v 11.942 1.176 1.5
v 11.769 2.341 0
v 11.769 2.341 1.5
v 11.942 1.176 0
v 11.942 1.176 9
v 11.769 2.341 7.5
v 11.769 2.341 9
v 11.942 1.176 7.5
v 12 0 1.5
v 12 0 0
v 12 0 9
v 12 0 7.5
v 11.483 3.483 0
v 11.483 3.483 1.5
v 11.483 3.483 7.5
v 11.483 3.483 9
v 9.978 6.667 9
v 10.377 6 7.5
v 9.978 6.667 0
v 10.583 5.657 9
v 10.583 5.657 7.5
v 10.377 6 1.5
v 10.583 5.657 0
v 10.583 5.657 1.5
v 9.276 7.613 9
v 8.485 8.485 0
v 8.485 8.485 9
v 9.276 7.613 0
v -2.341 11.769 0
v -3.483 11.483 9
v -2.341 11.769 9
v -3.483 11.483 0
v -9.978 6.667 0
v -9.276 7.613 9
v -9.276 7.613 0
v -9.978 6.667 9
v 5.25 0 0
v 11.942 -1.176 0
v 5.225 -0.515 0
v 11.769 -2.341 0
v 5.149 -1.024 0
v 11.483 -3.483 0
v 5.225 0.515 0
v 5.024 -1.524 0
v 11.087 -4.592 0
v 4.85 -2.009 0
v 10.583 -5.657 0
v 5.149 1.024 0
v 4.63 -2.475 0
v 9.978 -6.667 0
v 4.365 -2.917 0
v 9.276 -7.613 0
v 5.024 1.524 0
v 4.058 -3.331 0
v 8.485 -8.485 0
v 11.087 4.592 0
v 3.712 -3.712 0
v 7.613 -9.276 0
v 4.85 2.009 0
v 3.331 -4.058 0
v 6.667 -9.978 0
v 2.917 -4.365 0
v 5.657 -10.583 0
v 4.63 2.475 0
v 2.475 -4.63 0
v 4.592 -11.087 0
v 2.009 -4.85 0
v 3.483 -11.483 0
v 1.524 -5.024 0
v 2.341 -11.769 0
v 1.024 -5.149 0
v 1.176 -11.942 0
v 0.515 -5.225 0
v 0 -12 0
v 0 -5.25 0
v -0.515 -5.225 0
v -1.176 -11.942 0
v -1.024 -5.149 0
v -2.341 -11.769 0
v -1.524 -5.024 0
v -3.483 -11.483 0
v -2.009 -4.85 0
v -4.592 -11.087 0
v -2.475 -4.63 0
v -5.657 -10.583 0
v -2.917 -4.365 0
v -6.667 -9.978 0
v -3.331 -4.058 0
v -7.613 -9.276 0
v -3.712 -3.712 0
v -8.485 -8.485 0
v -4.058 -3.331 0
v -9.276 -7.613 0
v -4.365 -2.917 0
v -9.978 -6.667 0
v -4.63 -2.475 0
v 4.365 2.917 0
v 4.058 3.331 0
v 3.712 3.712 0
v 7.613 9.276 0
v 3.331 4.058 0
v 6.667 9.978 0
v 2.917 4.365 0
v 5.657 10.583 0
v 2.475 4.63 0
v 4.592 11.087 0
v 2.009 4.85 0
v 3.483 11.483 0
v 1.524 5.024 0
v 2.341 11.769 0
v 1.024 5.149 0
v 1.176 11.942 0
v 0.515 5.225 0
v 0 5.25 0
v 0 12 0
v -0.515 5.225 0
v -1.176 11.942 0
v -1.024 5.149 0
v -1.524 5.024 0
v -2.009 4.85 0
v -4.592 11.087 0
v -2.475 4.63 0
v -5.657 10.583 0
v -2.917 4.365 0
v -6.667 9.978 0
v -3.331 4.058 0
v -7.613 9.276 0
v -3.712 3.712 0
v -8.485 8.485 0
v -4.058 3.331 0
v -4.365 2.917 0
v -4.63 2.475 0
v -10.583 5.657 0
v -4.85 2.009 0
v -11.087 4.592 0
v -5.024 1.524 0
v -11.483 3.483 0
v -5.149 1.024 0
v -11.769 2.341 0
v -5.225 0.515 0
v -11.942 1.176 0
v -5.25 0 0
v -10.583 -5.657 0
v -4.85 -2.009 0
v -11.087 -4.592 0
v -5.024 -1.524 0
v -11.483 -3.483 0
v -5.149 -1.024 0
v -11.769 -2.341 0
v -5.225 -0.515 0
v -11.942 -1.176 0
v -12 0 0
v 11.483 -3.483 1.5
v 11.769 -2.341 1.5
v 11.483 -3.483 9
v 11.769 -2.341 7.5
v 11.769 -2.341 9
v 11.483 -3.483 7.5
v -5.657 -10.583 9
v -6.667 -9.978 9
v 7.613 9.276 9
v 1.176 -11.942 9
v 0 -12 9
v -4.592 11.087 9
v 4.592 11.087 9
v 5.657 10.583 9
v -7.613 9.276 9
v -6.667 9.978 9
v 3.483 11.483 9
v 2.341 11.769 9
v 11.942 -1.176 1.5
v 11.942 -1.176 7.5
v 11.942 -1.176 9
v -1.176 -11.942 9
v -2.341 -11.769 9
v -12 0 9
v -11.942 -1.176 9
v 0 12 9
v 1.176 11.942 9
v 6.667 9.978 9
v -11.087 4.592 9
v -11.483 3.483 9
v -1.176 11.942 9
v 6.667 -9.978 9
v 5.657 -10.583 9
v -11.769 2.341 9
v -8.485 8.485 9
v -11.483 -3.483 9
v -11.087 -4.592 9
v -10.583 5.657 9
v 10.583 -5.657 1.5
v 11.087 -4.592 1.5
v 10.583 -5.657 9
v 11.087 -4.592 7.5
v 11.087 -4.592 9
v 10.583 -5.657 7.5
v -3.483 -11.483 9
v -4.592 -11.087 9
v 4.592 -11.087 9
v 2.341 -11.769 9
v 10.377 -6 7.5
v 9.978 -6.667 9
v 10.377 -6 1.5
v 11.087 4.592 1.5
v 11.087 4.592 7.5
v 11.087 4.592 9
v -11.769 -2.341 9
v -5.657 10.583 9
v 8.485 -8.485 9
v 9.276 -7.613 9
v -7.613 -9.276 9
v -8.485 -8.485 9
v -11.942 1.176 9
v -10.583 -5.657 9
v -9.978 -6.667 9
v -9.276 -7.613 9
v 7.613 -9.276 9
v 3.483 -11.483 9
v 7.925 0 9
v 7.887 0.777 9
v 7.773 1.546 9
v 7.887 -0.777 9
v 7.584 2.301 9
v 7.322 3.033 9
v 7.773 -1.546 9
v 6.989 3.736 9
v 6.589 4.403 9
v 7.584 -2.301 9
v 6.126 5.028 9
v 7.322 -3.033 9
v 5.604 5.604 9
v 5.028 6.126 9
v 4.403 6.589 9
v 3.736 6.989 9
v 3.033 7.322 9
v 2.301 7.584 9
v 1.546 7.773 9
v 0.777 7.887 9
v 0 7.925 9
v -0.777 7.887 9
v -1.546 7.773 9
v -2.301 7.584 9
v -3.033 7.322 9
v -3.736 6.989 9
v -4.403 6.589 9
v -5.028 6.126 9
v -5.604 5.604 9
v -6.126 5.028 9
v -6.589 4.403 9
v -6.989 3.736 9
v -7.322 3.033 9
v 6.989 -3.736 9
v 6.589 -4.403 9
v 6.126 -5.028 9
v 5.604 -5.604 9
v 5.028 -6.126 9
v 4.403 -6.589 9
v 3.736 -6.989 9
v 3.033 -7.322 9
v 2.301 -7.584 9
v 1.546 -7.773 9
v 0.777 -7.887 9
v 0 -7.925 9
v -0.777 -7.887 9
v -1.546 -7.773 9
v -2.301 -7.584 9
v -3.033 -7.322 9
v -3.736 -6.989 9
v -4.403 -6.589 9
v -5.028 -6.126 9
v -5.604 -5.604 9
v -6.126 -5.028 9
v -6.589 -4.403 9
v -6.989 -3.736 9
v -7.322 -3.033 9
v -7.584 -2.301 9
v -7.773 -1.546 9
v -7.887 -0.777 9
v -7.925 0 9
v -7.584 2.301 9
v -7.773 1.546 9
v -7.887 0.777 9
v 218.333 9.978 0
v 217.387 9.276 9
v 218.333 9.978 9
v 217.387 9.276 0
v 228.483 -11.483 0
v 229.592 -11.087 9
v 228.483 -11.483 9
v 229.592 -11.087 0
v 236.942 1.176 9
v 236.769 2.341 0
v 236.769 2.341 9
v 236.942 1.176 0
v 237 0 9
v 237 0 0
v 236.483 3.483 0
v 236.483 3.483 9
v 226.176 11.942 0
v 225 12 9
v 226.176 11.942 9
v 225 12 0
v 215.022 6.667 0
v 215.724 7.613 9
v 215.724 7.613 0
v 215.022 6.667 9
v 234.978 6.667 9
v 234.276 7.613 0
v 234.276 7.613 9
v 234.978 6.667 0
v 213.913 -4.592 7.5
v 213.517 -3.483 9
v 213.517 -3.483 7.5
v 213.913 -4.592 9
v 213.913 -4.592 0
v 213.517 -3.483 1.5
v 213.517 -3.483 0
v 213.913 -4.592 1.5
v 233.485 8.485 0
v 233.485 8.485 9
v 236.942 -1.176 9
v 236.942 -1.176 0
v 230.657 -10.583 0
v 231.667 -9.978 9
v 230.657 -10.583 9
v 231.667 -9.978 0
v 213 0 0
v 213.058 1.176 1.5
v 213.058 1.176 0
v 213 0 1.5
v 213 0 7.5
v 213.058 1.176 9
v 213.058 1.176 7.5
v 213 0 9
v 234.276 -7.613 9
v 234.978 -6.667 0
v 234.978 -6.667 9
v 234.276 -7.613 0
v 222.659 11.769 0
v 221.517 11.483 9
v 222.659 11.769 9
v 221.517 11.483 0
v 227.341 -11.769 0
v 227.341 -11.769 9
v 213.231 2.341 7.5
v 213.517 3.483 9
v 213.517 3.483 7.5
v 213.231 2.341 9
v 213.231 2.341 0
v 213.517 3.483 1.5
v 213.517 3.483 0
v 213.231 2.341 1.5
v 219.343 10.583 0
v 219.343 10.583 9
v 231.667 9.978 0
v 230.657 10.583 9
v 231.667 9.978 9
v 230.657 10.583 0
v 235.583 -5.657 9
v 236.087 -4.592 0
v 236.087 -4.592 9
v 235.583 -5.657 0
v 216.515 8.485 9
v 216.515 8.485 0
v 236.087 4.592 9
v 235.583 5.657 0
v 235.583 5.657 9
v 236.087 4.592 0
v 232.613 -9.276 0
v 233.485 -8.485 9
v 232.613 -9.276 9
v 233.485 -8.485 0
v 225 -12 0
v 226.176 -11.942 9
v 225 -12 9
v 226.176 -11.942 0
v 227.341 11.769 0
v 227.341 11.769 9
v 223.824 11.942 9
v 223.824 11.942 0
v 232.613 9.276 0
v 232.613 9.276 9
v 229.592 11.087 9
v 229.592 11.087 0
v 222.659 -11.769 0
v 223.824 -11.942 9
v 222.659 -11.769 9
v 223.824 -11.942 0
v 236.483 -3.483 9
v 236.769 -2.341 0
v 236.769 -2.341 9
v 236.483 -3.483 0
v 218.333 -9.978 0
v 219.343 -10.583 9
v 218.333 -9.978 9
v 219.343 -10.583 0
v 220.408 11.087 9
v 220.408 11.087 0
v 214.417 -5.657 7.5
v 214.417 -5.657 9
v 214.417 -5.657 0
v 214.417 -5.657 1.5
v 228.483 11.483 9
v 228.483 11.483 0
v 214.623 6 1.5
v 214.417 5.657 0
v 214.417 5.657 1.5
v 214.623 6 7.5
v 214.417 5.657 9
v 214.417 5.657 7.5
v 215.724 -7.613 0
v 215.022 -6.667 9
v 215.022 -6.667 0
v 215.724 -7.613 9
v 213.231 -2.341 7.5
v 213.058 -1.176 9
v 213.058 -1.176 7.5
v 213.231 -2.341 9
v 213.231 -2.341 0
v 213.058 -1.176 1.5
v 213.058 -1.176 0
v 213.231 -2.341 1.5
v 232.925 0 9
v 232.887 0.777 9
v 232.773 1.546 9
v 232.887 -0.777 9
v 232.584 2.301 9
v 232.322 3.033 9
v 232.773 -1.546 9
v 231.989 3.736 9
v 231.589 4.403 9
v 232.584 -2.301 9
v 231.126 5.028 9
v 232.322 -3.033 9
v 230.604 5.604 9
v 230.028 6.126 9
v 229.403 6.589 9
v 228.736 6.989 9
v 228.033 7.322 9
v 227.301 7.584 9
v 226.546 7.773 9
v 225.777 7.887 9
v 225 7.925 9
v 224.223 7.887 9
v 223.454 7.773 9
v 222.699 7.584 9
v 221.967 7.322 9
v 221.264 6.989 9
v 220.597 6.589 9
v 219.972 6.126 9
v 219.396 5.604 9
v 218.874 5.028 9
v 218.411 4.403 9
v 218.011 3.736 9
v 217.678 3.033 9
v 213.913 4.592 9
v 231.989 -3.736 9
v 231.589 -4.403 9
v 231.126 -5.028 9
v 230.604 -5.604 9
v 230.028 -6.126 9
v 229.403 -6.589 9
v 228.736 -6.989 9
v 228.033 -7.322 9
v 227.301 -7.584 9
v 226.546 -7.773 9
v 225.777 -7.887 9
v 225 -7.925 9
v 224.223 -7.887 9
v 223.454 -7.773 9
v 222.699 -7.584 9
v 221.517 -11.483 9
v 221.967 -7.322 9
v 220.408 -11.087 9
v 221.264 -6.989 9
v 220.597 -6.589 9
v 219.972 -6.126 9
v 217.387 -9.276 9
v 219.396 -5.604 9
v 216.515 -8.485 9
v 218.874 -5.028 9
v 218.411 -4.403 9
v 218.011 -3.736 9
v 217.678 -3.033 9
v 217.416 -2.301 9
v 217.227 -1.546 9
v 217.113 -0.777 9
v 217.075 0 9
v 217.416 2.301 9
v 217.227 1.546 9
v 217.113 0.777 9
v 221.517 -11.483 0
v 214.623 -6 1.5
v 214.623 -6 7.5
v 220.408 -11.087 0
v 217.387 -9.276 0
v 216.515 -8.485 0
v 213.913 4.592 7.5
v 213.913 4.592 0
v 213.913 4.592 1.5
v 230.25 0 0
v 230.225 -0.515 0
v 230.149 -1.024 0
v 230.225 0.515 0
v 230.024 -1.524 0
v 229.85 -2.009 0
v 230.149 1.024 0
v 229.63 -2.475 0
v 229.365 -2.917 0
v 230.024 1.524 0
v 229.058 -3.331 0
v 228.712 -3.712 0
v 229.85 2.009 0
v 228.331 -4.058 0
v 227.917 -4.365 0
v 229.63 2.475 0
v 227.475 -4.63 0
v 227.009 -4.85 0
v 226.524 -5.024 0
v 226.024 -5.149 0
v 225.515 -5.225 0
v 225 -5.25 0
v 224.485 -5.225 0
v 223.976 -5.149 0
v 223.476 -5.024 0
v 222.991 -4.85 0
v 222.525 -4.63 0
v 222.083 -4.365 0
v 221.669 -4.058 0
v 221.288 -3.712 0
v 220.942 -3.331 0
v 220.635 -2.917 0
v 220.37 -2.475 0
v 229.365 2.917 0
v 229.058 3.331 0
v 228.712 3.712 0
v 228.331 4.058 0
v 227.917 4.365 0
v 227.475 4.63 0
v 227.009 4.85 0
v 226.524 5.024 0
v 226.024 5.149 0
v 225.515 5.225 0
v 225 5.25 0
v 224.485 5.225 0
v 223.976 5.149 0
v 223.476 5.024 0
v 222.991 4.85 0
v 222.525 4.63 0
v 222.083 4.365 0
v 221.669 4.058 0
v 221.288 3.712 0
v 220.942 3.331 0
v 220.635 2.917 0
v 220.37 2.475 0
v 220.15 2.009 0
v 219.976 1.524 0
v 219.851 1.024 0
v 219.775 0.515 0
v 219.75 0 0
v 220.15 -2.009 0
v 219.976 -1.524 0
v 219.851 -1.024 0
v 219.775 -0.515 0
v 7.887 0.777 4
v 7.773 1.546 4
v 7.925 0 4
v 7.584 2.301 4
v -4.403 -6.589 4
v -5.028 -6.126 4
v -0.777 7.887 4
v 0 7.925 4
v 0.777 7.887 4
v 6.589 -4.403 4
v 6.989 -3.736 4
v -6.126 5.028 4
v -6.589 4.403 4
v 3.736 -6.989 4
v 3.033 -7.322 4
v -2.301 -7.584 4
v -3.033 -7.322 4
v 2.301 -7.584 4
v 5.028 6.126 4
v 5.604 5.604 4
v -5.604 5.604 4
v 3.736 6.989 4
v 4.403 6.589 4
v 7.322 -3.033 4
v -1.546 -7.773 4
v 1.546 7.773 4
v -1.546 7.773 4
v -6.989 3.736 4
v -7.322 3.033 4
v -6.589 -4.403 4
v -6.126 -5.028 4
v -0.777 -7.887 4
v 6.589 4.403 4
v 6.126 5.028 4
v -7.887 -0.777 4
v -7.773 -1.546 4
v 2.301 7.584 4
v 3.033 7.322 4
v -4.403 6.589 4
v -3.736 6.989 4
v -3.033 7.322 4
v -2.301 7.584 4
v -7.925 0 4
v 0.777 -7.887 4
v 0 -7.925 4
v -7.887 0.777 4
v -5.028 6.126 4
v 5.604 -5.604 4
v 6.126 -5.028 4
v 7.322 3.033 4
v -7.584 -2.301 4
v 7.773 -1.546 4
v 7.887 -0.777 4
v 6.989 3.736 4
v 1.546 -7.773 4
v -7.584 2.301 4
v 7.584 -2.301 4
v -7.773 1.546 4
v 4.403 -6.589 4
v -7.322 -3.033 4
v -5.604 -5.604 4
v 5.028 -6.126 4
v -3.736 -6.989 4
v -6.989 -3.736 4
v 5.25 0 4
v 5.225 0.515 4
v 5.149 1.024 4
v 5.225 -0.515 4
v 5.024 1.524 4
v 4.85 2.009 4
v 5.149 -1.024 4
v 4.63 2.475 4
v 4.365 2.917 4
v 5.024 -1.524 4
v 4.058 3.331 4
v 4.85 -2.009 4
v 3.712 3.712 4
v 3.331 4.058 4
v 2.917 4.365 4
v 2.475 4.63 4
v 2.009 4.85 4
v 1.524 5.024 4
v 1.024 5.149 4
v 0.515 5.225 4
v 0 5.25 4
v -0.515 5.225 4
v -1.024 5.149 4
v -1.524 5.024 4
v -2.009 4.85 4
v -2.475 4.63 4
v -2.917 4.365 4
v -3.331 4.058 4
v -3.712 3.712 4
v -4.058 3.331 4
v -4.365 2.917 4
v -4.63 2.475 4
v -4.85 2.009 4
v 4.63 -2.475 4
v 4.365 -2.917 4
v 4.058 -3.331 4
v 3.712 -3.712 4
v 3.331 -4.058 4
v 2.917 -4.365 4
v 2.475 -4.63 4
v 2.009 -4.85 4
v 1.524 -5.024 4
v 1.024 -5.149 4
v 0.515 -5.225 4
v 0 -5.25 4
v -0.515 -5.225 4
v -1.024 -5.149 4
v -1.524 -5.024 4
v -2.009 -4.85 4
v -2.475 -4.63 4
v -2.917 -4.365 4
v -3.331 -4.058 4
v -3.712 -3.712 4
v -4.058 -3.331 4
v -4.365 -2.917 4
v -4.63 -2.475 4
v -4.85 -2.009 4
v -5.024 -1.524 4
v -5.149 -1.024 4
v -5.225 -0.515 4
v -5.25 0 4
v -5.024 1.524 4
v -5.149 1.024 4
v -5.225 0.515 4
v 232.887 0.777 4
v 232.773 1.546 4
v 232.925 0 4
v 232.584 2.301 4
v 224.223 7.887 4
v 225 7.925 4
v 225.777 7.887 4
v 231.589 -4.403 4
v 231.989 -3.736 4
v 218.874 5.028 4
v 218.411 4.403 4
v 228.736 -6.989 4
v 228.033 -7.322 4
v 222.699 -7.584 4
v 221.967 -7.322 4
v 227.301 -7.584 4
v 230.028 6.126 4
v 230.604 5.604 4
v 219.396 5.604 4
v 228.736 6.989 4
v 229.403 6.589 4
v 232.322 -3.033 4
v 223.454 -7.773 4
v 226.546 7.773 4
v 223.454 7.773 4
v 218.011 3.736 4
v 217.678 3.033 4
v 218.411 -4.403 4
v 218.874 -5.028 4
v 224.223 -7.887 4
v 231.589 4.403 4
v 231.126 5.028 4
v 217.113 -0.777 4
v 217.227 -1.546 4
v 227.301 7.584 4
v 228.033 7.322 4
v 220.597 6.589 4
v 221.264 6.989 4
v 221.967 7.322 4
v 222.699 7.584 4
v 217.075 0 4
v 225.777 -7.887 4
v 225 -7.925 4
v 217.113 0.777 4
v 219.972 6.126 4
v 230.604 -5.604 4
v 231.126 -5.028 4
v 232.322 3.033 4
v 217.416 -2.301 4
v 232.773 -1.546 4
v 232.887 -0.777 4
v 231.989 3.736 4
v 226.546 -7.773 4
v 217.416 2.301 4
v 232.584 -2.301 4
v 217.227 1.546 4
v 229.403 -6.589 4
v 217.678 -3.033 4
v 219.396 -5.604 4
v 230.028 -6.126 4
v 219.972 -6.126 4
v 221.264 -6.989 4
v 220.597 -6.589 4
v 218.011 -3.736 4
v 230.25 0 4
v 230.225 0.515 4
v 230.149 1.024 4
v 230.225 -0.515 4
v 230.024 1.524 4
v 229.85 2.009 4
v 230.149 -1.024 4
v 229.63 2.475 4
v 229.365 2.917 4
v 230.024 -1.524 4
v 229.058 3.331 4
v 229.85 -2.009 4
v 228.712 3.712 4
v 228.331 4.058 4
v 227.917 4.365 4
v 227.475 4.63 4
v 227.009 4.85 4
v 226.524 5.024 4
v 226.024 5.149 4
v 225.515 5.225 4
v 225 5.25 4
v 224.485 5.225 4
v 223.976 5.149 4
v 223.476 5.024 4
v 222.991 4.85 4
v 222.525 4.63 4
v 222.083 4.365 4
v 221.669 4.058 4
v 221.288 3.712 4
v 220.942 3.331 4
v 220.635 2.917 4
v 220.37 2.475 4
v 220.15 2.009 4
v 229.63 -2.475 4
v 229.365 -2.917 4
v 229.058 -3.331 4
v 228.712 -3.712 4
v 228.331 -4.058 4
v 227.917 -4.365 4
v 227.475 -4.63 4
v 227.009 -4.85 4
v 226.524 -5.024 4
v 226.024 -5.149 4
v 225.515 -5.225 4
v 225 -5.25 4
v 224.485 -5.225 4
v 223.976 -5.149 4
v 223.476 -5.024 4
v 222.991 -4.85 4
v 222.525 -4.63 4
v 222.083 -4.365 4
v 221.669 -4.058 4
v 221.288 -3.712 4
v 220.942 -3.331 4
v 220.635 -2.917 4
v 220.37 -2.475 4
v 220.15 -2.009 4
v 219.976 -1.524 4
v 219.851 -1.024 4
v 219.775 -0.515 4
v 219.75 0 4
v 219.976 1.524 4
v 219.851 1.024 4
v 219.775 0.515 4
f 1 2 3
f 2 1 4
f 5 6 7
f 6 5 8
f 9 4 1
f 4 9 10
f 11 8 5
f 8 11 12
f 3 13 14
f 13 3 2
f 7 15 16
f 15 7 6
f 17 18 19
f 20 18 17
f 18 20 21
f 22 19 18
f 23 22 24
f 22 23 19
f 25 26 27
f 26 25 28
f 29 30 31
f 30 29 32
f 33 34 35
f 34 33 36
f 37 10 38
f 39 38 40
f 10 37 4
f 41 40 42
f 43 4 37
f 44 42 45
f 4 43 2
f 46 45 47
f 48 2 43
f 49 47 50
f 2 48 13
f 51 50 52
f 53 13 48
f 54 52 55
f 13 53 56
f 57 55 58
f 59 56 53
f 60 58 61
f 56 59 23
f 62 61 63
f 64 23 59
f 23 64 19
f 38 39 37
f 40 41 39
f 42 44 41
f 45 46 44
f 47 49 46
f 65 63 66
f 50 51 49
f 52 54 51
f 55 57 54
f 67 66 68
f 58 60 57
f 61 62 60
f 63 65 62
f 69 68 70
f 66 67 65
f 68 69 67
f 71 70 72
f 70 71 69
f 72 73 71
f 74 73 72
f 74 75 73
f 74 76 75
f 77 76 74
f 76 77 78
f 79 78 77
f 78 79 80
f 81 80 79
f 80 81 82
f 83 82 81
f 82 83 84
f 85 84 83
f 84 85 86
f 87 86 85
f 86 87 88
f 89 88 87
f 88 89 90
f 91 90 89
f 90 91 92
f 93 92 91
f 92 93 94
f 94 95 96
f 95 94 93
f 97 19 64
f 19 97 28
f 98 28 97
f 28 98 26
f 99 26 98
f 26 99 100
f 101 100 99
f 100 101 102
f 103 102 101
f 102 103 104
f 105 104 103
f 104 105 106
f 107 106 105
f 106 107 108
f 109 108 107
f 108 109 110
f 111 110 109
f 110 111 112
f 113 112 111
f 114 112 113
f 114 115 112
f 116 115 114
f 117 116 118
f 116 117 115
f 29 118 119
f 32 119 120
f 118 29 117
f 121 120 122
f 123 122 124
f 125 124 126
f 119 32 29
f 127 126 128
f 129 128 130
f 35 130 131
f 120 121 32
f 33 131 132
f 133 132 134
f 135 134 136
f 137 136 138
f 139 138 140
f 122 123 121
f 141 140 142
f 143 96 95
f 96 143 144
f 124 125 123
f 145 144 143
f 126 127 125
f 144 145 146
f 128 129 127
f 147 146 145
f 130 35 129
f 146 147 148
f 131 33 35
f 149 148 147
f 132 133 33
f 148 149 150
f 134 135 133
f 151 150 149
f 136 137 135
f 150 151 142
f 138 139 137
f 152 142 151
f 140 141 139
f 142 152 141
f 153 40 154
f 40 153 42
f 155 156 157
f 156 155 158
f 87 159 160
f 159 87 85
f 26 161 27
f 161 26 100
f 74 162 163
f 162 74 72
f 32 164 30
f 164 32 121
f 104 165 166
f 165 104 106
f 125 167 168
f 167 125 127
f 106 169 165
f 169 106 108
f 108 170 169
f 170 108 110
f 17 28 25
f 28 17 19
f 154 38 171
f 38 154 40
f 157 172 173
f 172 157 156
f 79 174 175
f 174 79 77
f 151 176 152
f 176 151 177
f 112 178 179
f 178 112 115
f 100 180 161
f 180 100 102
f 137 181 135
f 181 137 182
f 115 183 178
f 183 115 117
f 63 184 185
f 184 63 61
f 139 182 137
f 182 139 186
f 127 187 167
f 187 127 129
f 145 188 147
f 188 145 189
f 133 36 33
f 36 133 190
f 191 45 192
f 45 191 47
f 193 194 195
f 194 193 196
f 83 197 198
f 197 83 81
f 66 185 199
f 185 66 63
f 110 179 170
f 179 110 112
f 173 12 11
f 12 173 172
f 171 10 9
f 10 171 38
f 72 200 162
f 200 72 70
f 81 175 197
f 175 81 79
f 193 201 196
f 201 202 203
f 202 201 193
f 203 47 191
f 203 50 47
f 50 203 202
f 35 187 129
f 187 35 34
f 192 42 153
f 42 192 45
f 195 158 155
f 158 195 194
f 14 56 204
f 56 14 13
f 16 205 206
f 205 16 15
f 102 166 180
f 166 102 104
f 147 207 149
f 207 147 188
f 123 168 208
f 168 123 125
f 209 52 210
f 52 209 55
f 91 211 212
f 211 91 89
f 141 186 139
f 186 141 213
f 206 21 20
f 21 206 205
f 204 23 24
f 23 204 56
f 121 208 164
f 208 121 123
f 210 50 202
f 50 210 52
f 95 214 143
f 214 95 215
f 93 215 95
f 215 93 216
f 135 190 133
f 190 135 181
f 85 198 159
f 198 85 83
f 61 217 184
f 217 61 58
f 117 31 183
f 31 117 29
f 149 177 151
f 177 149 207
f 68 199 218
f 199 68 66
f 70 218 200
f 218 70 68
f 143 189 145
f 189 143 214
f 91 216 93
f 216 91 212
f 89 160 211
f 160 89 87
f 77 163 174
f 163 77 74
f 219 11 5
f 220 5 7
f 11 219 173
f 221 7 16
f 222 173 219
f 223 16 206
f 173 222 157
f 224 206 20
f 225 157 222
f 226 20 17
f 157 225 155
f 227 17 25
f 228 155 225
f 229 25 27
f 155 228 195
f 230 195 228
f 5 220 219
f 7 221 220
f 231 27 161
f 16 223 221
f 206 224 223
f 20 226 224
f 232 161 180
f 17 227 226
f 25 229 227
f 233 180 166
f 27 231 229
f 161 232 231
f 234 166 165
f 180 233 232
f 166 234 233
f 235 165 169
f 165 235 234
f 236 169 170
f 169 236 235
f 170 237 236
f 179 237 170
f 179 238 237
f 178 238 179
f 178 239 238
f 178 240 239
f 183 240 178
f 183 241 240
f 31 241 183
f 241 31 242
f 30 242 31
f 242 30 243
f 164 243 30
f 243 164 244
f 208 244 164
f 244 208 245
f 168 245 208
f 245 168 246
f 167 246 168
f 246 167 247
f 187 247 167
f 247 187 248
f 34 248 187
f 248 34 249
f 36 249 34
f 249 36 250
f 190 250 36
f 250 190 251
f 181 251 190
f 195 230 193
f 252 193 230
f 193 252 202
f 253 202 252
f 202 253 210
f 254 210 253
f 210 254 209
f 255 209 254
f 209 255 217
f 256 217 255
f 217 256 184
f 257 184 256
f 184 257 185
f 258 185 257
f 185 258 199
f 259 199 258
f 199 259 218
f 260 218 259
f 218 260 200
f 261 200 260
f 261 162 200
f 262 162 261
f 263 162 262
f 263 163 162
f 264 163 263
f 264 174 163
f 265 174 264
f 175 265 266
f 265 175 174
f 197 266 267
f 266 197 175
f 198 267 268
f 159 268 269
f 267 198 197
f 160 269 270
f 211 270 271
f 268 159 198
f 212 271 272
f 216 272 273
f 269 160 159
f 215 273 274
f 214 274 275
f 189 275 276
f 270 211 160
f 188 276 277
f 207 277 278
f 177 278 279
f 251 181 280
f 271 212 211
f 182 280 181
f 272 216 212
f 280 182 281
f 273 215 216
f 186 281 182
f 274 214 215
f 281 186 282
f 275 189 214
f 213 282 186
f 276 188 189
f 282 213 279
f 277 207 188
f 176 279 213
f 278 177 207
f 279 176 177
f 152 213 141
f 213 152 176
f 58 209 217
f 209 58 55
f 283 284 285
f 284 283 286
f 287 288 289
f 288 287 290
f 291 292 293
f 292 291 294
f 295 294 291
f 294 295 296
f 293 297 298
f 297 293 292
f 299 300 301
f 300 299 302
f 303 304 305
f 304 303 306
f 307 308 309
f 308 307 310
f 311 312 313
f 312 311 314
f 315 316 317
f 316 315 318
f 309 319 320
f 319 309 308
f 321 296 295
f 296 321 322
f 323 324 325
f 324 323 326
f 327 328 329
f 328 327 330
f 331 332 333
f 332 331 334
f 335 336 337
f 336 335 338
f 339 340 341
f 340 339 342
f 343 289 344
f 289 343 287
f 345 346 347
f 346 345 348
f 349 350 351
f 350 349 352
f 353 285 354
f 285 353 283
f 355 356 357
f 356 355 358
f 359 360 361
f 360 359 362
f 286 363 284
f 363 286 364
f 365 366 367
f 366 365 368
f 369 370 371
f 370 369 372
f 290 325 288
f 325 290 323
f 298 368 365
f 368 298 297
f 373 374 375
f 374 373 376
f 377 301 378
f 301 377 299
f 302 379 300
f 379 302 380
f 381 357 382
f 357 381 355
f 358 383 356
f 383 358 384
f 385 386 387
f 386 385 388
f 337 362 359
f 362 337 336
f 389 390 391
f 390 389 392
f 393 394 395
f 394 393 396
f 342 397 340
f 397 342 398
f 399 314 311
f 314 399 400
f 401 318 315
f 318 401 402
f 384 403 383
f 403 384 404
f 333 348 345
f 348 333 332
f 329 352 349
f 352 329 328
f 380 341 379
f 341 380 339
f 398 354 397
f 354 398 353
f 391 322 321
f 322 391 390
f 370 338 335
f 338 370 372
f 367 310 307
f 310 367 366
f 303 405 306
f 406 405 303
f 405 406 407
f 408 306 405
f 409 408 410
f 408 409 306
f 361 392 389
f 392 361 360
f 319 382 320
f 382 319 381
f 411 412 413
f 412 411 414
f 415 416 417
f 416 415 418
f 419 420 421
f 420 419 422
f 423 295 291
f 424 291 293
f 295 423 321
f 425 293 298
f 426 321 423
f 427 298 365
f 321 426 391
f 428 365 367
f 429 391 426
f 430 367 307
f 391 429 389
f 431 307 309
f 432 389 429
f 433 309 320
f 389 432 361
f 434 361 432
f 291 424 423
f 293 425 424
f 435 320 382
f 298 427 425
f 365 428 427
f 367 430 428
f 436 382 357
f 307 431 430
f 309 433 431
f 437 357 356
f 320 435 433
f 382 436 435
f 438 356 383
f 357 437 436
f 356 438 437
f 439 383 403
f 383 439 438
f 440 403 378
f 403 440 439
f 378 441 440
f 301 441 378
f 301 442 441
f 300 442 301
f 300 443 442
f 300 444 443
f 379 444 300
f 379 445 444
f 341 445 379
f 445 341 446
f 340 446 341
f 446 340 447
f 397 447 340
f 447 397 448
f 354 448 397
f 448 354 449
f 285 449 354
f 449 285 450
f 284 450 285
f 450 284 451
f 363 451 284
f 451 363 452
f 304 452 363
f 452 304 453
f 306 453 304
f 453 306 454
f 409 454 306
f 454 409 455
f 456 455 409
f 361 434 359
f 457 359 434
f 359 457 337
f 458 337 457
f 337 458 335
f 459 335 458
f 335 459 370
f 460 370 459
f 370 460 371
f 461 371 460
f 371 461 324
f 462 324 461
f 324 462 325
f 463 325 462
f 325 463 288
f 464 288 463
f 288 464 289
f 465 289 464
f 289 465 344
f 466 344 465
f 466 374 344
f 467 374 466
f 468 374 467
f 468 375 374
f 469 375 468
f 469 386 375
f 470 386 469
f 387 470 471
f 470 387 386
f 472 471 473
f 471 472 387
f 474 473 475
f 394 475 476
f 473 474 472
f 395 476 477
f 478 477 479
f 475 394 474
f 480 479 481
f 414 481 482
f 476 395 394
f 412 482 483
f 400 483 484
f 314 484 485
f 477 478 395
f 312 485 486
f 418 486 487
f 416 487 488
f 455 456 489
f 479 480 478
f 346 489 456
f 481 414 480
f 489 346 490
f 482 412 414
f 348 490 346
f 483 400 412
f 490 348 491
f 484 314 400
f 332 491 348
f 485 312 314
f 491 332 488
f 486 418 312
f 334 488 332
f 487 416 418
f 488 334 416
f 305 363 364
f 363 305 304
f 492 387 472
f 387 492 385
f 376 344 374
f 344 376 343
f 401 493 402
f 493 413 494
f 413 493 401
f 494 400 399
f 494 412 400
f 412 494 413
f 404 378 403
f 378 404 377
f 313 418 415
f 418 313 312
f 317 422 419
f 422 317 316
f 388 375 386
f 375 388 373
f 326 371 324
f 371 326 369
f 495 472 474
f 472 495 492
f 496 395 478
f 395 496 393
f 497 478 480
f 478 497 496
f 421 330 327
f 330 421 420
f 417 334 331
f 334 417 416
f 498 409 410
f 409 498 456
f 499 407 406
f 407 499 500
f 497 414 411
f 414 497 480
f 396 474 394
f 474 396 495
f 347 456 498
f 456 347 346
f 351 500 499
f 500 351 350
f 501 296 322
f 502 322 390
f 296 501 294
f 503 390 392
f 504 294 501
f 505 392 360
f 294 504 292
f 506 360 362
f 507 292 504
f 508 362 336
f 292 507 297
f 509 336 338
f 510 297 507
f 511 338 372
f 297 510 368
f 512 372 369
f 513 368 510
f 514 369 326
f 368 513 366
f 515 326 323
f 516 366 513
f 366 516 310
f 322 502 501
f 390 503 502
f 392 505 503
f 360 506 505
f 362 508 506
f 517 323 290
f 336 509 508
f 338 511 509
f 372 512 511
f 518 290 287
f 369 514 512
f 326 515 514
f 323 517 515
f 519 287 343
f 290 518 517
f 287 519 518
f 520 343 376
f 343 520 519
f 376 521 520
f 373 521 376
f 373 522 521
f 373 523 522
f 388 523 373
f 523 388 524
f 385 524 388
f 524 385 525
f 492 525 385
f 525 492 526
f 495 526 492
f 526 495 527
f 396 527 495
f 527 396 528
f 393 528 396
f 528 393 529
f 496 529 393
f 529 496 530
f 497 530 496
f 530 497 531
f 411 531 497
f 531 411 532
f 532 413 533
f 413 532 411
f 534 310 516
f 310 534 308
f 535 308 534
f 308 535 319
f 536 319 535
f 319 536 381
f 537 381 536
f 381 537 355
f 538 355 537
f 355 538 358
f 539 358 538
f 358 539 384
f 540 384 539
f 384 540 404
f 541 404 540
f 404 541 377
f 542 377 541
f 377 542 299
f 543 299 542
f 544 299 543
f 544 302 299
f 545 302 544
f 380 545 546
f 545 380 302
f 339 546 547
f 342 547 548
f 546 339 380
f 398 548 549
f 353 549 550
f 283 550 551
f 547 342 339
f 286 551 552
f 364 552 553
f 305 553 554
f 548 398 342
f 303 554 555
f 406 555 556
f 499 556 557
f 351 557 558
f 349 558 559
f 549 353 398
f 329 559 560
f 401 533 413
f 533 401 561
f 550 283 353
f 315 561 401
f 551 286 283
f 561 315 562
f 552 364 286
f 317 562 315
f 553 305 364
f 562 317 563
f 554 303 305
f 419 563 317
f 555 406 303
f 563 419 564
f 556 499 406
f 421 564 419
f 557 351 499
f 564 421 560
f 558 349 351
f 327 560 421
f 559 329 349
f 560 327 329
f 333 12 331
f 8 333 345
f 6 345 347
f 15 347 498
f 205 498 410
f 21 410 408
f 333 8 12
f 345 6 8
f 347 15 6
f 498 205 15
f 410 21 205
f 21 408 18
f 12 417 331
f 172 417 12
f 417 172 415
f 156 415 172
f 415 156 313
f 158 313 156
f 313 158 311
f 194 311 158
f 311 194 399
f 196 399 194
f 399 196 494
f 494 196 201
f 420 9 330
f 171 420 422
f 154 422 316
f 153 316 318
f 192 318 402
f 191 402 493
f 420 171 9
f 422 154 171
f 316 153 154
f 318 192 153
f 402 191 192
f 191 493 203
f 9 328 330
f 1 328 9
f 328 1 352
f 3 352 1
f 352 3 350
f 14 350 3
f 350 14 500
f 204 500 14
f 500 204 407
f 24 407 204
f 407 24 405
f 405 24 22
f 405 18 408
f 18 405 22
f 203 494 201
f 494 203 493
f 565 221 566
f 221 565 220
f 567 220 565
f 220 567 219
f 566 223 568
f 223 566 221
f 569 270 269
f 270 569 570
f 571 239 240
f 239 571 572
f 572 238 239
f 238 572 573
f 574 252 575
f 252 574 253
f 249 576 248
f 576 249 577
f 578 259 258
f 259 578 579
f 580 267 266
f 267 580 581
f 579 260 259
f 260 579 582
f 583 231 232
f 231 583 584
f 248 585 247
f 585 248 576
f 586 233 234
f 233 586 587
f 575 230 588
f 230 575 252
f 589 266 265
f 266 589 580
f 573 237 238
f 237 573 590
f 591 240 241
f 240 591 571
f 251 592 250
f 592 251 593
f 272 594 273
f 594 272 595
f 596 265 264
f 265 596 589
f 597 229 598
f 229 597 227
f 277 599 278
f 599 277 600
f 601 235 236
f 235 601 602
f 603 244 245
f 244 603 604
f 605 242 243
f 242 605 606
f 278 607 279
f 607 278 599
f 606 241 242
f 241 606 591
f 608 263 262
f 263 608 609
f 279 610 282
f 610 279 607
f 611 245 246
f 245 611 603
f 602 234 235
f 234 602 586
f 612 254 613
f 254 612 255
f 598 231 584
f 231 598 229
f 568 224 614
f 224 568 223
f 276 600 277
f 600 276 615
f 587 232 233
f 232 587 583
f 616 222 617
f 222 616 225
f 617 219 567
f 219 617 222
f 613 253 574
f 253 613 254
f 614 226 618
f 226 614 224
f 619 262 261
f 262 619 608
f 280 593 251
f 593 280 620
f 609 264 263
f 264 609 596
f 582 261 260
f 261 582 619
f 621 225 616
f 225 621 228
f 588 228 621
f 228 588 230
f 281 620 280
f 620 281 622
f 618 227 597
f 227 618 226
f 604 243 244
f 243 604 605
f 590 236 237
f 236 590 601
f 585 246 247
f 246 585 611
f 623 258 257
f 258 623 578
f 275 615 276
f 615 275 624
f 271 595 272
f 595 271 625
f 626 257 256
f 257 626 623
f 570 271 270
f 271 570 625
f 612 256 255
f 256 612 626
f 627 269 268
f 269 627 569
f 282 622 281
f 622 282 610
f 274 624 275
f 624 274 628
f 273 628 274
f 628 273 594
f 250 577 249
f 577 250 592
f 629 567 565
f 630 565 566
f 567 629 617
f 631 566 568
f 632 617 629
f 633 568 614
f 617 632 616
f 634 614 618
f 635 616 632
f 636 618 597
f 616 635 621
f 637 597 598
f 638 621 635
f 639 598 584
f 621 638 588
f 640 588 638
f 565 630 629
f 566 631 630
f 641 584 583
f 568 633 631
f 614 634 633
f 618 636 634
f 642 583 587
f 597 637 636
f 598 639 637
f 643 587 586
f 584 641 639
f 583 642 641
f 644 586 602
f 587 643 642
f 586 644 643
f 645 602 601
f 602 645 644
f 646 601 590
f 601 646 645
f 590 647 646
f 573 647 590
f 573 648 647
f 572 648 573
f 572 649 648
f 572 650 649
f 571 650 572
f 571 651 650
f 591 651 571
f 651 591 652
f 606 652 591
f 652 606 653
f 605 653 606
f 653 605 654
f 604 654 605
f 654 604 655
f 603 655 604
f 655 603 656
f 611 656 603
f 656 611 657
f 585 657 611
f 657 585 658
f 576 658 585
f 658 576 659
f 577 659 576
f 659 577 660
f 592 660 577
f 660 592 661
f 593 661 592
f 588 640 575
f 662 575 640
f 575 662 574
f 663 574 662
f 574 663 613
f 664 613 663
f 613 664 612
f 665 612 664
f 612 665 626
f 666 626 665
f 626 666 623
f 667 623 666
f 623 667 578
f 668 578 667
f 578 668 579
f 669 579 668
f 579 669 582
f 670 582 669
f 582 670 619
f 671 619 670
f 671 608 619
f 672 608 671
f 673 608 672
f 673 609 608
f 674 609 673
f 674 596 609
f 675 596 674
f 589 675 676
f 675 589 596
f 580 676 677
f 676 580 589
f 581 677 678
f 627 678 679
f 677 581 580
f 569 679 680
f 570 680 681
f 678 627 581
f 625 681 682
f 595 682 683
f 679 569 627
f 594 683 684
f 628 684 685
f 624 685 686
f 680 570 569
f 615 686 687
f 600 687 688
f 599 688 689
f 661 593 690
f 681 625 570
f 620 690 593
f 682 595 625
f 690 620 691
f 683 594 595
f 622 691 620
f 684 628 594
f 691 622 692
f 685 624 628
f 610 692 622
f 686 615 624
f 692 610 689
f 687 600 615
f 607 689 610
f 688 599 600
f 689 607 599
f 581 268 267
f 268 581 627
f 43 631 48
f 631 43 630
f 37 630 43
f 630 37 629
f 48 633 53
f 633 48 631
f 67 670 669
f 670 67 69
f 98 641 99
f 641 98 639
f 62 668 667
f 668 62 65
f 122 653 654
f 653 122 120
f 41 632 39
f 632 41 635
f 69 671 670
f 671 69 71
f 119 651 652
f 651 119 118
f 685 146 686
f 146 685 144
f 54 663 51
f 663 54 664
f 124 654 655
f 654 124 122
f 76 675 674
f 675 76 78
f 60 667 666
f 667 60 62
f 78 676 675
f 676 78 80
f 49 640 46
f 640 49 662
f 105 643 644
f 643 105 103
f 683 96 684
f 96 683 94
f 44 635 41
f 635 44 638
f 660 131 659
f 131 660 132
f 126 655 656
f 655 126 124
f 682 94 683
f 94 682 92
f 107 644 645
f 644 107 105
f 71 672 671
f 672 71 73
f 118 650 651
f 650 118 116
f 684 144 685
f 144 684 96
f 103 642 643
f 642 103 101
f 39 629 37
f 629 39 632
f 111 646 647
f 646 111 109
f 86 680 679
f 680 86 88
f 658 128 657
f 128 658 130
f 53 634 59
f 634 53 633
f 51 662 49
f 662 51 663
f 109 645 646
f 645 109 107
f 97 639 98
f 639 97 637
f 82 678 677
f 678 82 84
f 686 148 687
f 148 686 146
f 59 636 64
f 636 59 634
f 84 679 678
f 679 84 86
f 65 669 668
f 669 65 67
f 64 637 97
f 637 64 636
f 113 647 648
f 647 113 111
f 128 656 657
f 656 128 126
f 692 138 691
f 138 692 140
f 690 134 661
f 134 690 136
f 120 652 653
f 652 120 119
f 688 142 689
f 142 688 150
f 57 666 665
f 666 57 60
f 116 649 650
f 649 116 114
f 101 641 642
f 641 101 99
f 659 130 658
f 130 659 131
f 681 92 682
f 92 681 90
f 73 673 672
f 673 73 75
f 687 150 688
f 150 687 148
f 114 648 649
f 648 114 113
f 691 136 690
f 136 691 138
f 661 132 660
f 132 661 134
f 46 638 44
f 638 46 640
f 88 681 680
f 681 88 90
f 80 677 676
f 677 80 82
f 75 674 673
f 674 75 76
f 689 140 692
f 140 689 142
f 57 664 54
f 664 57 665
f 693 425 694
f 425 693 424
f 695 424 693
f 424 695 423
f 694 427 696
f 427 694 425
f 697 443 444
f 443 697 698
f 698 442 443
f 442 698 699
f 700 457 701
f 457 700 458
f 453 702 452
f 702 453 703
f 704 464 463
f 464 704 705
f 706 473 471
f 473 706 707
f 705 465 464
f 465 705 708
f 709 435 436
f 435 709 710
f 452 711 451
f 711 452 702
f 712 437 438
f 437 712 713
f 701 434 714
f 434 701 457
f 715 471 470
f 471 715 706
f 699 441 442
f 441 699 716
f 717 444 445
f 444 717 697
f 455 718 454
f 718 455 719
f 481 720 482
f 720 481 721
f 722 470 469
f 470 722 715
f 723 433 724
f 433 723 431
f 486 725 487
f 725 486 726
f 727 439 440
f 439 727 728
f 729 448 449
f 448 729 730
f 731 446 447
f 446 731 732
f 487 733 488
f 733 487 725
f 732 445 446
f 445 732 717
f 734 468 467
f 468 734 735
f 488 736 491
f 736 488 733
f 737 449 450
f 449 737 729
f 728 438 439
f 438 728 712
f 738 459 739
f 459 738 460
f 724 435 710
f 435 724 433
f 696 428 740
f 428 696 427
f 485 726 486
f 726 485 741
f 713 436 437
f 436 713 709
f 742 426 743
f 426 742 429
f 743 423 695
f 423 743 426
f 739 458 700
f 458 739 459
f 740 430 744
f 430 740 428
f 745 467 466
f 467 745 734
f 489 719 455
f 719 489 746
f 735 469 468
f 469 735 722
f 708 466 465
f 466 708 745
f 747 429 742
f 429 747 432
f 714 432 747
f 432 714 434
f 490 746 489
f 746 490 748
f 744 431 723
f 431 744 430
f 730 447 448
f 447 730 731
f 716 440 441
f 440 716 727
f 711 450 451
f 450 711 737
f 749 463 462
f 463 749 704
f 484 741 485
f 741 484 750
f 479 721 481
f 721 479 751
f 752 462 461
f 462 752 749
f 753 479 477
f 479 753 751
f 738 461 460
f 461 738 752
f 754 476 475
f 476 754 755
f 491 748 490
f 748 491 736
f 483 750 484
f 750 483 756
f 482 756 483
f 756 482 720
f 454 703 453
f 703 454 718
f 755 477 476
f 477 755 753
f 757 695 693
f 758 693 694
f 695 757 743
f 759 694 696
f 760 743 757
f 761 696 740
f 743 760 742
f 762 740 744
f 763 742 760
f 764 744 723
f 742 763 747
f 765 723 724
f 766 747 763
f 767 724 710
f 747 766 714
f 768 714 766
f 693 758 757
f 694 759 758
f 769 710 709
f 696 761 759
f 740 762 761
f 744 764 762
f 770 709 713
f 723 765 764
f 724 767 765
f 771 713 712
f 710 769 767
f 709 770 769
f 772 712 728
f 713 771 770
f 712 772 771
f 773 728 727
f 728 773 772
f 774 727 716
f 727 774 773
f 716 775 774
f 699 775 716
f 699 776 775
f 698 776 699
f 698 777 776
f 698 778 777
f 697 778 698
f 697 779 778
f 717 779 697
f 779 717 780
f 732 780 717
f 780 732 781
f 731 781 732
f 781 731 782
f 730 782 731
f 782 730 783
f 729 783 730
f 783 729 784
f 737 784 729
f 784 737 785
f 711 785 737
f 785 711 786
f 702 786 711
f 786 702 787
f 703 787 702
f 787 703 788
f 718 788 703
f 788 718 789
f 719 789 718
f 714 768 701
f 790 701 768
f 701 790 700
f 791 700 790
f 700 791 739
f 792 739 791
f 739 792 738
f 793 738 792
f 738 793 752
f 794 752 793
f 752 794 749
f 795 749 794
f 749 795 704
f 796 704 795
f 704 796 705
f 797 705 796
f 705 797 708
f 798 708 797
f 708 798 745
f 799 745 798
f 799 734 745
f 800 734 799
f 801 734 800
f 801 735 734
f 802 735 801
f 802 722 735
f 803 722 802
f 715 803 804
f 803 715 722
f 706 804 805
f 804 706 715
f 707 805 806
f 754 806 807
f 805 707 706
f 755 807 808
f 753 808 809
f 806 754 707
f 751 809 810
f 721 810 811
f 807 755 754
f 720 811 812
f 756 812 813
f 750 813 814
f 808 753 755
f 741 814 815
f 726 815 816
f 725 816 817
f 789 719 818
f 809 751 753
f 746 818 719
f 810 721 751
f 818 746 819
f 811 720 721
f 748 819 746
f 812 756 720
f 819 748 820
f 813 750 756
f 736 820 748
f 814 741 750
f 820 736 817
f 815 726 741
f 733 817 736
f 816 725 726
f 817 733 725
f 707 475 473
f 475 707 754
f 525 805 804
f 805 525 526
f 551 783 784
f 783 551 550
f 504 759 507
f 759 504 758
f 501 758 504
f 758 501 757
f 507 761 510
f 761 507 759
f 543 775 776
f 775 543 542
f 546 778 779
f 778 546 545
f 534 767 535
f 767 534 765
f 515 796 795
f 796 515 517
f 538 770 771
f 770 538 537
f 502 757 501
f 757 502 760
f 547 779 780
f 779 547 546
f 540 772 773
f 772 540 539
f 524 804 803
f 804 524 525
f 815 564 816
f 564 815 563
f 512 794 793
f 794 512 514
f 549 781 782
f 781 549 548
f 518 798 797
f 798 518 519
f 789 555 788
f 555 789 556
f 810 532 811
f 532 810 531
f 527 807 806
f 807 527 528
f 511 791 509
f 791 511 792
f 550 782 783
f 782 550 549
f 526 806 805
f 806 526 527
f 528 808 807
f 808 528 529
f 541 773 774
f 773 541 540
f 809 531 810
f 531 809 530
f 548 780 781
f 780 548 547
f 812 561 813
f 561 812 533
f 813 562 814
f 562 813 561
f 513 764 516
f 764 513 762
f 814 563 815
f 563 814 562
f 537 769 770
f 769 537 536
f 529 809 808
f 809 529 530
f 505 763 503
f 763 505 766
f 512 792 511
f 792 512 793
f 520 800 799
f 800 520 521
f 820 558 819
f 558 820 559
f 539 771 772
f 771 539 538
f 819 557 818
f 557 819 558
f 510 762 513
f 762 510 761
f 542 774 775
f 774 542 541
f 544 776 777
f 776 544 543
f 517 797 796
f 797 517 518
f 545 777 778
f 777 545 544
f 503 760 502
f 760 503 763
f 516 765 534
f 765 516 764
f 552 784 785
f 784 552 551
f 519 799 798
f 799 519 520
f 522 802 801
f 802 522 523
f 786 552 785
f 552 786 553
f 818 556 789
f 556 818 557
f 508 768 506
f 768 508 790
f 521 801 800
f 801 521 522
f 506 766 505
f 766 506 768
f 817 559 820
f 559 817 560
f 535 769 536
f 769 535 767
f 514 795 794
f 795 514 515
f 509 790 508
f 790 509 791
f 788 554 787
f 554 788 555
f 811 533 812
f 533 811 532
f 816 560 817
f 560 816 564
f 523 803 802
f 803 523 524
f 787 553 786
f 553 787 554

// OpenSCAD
// file: ../lib/utils.scad
// 공통 모듈 (common modules) — 베어링 시트, 볼트 홀 등
include <../config/parameters.scad>

// 베어링 시트 (bearing seat): 압입 공차 적용 포켓
// brg = [내경, 외경, 폭] (예: BRG_608ZZ)
module bearing_seat(brg) {
    cylinder(d = brg[1] + bearing_press_fit, h = brg[2]);
}

// 베어링 시트 + 내륜 도피 홀 (관통)
// wall = 시트 아래 받침 두께
module bearing_pocket(brg, wall = 2) {
    union() {
        translate([0, 0, wall]) bearing_seat(brg);
        // 내륜 접촉 방지: 내경보다 크고 외경보다 작은 도피 홀
        cylinder(d = (brg[0] + brg[1]) / 2, h = wall + 0.1);
    }
}

// 관통 볼트 홀 (clearance hole)
module bolt_hole(d, h) {
    cylinder(d = d + bolt_hole_oversize, h = h);
}

// NEMA 17 모터 마운트 홀 패턴 (CON-004: SF24 = 42각 NEMA 17 호환)
// h = 판 두께
module nema17_mount(h) {
    union() {
        cylinder(d = nema17_pilot_d + clearance_fit, h = h);
        for (x = [-1, 1], y = [-1, 1])
            translate([x * nema17_hole_pitch / 2, y * nema17_hole_pitch / 2, 0])
                bolt_hole(nema17_bolt_d, h);
    }
}

// 숄더 볼트 피벗 홀 (CON-001)
// d = 숄더 직경 (shoulder_d_small | shoulder_d_large)
module pivot_hole(d, h) {
    cylinder(d = d + clearance_fit, h = h);
}

// 베어링 보스 (bearing boss): 출력물 허브에 베어링 내경 직접 안착 (CON-003)
// 내경 기준 압입 — bearing_press_fit(음수)만큼 키운다
module bearing_boss(brg, h) {
    cylinder(d = brg[0] - bearing_press_fit, h = h);
}

// 육각 너트 포켓 (nut pocket) — 차집합용. af = 평면폭(across flats)
module nut_pocket(af, t) {
    cylinder(d = (af + clearance_fit) / cos(30), h = t, $fn = 6);
}

// 리미트 스위치 장착 홀 쌍 (ELE-004) — 차집합용, X축 방향 피치
module ls_mount_holes(h) {
    for (x = [-1, 1])
        translate([x * ls_hole_pitch / 2, 0, 0])
            cylinder(d = ls_hole_d, h = h);
}

// 케이블 가이드 클립 (ELE-005) — 외면 부착형 C-클립, cable_d 다발 직경
module cable_clip(cable_d = 8, t = 4) {
    wall = 2.5;
    difference() {
        cylinder(d = cable_d + 2 * wall, h = t);
        translate([0, 0, -0.1]) cylinder(d = cable_d, h = t + 0.2);
        // 삽입 개구 (개구 폭 = 케이블 직경의 70%)
        translate([0, -cable_d * 0.35, -0.1])
            cube([cable_d, cable_d * 0.7, t + 0.2]);
    }
}

// 평행/구동 링크 바 (625ZZ 양단, MEC-002/MEC-001a)
// len = 피벗 간 거리. 보스 상면에서 베어링 압입, 하면 내륜 도피 홀.
module link_bar(len) {
    boss_t = BRG_625ZZ[2] + 4;
    difference() {
        union() {
            translate([0, -link_bar_w / 2, (boss_t - link_bar_t) / 2])
                cube([len, link_bar_w, link_bar_t]);
            for (x = [0, len])
                translate([x, 0, 0]) cylinder(d = link_boss_d, h = boss_t);
        }
        for (x = [0, len]) {
            translate([x, 0, boss_t - BRG_625ZZ[2]])
                bearing_seat([BRG_625ZZ[0], BRG_625ZZ[1], BRG_625ZZ[2] + 0.1]);
            translate([x, 0, -0.1])
                cylinder(d = (BRG_625ZZ[0] + BRG_625ZZ[1]) / 2, h = boss_t + 0.2);
        }
    }
}

// 지시선(leader) + 빌보드(billboard) 라벨 — 프리뷰용, $vpr 카메라 추종
// p = 앵커(부품 측), v = 지시선 벡터 (라벨은 p+v 위치)
// 주의: 상위 프레임이 회전된 경우 빌보드가 카메라를 향하지 않음 — 월드 프레임에서 호출할 것
module leader_label(p, v, txt, size = 3.2, col = "white") {
    color(col) {
        hull() {
            translate(p) sphere(d = 1.4, $fn = 12);
            translate(p + v) sphere(d = 1.4, $fn = 12);
        }
        translate(p + v) rotate($vpr) translate([2, -size / 2, 0])
            linear_extrude(0.6) text(txt, size = size);
    }
}

// 축 클램프 슬릿 + M3 핀치 볼트 (차집합용)
// bore_d = 클램프 보어, depth = 보어 깊이, body_d = 보스 외경
module shaft_clamp_cut(bore_d, depth, body_d) {
    union() {
        cylinder(d = bore_d + clearance_fit / 2, h = depth);
        // 슬릿
        translate([-1, 0, -0.1]) cube([2, body_d / 2 + 1, depth + 0.1]);
        // M3 핀치 볼트 (슬릿 직교) — 보어 반경과 보스 반경 사이
        translate([0, (bore_d / 2 + body_d / 2) / 2 + 1, depth / 2])
            rotate([0, 90, 0])
                translate([0, 0, -body_d / 2 - 1])
                    bolt_hole(3, body_d + 2);
    }
}
// file: ../config/parameters.scad
// cobot-lite 전역 파라미터 (global parameters)
// 모든 부품 치수는 이 파일에서만 정의한다 — 매직 넘버 하드코딩 금지 (MEC-008)

/* ===== 출력/렌더링 ===== */
$fn = 64;

/* ===== 공통 가공 여유 (파생 치수에서 참조 — 선행 정의 필수) ===== */
clearance_fit = 0.3;      // 회전/슬라이드 끼움 여유
bolt_hole_oversize = 0.4; // 관통 볼트 홀 여유

/* ===== 베어링 (bearing) — CON-002: 이 4종만 사용 =====
   [내경, 외경, 폭] mm */
BRG_608ZZ  = [8,  22, 7];   // 관절 피벗 (8mm 숄더 볼트)
BRG_625ZZ  = [5,  16, 5];   // 평행 링크 피벗 (5mm 숄더 볼트)
BRG_6805ZZ = [25, 37, 7];   // 손목 롤 축, 중구경 허브
BRG_6810ZZ = [50, 65, 7];   // 베이스 턴테이블 메인 베어링

// 베어링 압입 공차 (press-fit tolerance) — MFG-002
// 외경 기준 -0.1 ~ -0.2mm. 프린터별 보정은 이 변수 하나로 조정한다.
bearing_press_fit = -0.15;

/* ===== 숄더 볼트 (stripper/shoulder bolt) — CON-001 ===== */
shoulder_d_small = 5;   // 625ZZ 결합
shoulder_d_large = 8;   // 608ZZ 결합

/* ===== 링크 길이 — MEC-006 [TBD-4] =====
   리치 500mm 잠정. 비대칭 분할 (J2 자중 부담 보상, MEC-001a 분담 구조) */
L1 = 225;   // 상완 (upper arm): J2 축 → J3 축
L2 = 275;   // 하완 (forearm): J3 축 → 공구 플랜지

/* ===== 링크 꺾임 (팔레타이저식 구조 오프셋) =====
   관절 축 좌표는 불변(직선 L1/L2 기준) — 꺾임은 빔 형상만 변경.
   목적: ① 신장/접힘 한계 자세에서 빔-빔 간섭 여유 확보
        ② 구조 외곽을 축선 위로 올려 저자세 작업 시 팔꿈치 하부 돌출 감소
   니(knee) 수직 오프셋 h = L·pos·(1-pos)·tan(deg) */
ua_bend_deg = 12;     // 상완 꺾임각 (0 = 직선)
ua_bend_pos = 0.68;   // 꺾임 위치 (0~1, J2 기준) — 분할 조인트(95~131) 뒤
fa_bend_deg = 12;     // 하완 꺾임각
fa_bend_pos = 0.5;    // 꺾임 위치 (팔꿈치 기준)

/* ===== 가동 엔벨로프 (소프트 리미트 권고값 — docs/design-notes.md) =====
   접힘각 = J3 - J2 (월드 피치 차).
   -90° = 평행사변형 구동 전동각(transmission angle) 특이점 (크랭크∥링크),
     0° = 완전 신장 특이점 (J2·J3·손목 일직선). 양쪽 모두 운용 금지 */
env_fold_min = -75;   // 접힘 한계 (전동각 sin25° ≈ 0.42 이상 확보)
env_fold_max = -3;    // 신장 한계 (리치 ≈ 499.5mm — 공칭 500 대비 -0.5)

// J3 모터 후방 배치 연장 길이 (MEC-001c)
// J2 액추에이터는 J2 축 동축 직결 (MEC-001b) — 후방 배치 대상은 J3 어셈블리만
// J1 회전 시 베이스·작업물 간섭 확인 필수
rear_extension = 80;    // J2 피벗 → J3 모터+기어박스 어셈블리 중심 [잠정]

/* ===== 턴테이블 (turntable) — MEC-003 ===== */
turntable_bearing_gap = 30;   // 6810ZZ 2개 축방향 이격, 30mm 이상 (SHOULD)

/* ===== 모터 (motor) — CON-004: 산요덴키 SF24 시리즈 =====
   NEMA 17 호환 42각 */
motor_frame = 42;             // 프레임 폭 (mm)
nema17_hole_pitch = 31;       // 고정 볼트 피치
nema17_pilot_d = 22;          // 센터 파일럿 직경
nema17_bolt_d = 3;            // M3

/* ===== 감속비 (gear ratio) — CON-005: 5/10/20만 허용 ===== */
// 주의: MG17-G10(10:1)은 허용 토크 5N·m로 급락 — 변경 시 토크 재검증 (docs/torque-budget.md)
ratio_J1 = 20;
ratio_J2 = 20;
ratio_J3 = 20;   // SF2423 + 20:1 확정 (TBD-3 해결)
ratio_J4 = 5;

/* ===== 기어박스 (gearbox) — MG17 데이터시트 (docs/tbd-research.md TBD-5) ===== */
gbx_frame = 42;            // NEMA 17 플랜지, 모터와 동일 42각
gbx_len_20to1 = 51;        // MG17-G20 길이 (J1~J3)
gbx_len_5to1  = 40;        // MG17-G5 길이 (J4)
gbx_out_shaft_d = 8;       // 출력축 직경
gbx_in_insert = 9.5;       // 입력 결합 깊이 — SF24 축 길이 호환 확인 항목
gbx_mass_20to1 = 400;      // g — 질량 예산 계산용
gbx_mass_5to1  = 350;      // g

/* ===== 모터 몸체 치수 — SF24 카탈로그 일반값 [잠정: 구매 데이터시트로 확인] ===== */
motor_len_SF2424 = 47;    // J1, J2
motor_len_SF2423 = 39;    // J3
motor_len_SF2422 = 33;    // J4
motor_shaft_d = 5;        // SF24 출력축 (MG17 입력 클램프 ⌀5)
gbx_out_shaft_len = 20;   // MG17 출력축 돌출 길이

/* ===== 베이스/J1 (MEC-003, MEC-005) ===== */
base_plate_size = 140;    // 정사각 베이스 플레이트 한 변
base_plate_t = 8;
base_bolt_d = 5;          // M5 ×4 작업대 고정 (MEC-005)
base_bolt_pitch = 120;    // 고정 볼트 피치
base_col_wall = 5;        // 턴테이블 칼럼 벽 두께
col_window_w = 50;        // 칼럼 측면 배선/조립 창 폭
turntable_top_d = 100;    // 턴테이블 상판 직경
turntable_top_t = 8;
j1_actuator_gap = 4;      // 베이스 플레이트 상면 → 모터 하면 여유
col_open_h = 24;          // 모터 플로어 상면 → 하부 베어링 (스템 결합·셋스크류 존)
j1_stem_d = 20;           // 턴테이블 허브 스템(출력축 결합부) 외경
set_screw_pilot_d = 3.4;  // M4 무두 볼트(set screw) 셀프태핑 파일럿
m3_tap_d = 2.8;           // M3 셀프태핑 파일럿 (앵커 등 소형 체결)
shoulder_mount_px = 80;   // 어깨 텅 ↔ 턴테이블 볼트 피치 X
shoulder_mount_py = 50;   // 어깨 텅 ↔ 턴테이블 볼트 피치 Y
shoulder_mount_bolt_d = 5;// M5 ×4
shoulder_tongue_x = 40;   // 어깨 텅 깊이(X) — 포크 내 스윕 간섭 한계 결정 (J2 ≈ ±55°)

/* ===== 암 단면/관절 (MEC-004) — v0.13 플레이트 아키텍처 =====
   원칙: 출력물은 평판(plate)만. 간격은 표준 스페이서 튜브 + 관통 볼트가
   결정 (일체 보스·웹·박스 금지). 관절 베어링은 플레이트에 직접 압입 —
   플레이트 두께 = 608ZZ 폭(7) */
arm_plate_t = 7;          // 측판 두께 = 608ZZ 폭 (베어링 인-플레이트 압입)
fork_standoff_len = 30;   // 표준 육각 스탠드오프 길이 (어깨 포크 갭 = 하완 내폭)
hex_standoff_af = 13;     // 두꺼운 육각 스탠드오프 평면폭 (M6 암-암)
joint_spacer_od = 12;     // 관절 스택 스페이서 튜브 외경 (숄더 ⌀8 위)
ua_split_x = 115;         // 상완 플레이트 분할선 (365 > 빌드 대각 한계)
ua_splice = [99, 131];    // 스플라이스 더블러 볼트 X 위치 (분할선 ±16)
// 어깨 텅(플레이트 스택) 폭 = 플레이트 14 ×2 + 표준 스탠드오프 30 (v0.13)
tongue_w = 28 + fork_standoff_len;          // 58
// 상완 포크 내폭 = 표준 육각 스탠드오프 L60 (전 스탠드오프 표준화 — v0.14).
// 텅 58과의 편차 1mm/측은 J2 스택 M8 와셔가 흡수 (CON-001 와셔 기존 품목)
arm_inner_w = 60;
arm_h = 50;               // 암 단면 높이
j2_axis_h = 90;           // 턴테이블 상면 → J2 축 높이
                          // — J2 +45° 시 후방 러그 하단 ↔ 어깨 플랜지 간섭 회피 (간섭 검사 확인)
j3_crank_len = 40;        // J3 크랭크 = 하완 혼 반경 (평행사변형 1:1)
pl_offset = 45;           // 수동 평행사변형(MEC-002) 피벗 오프셋
                          // — J2 모터 42각 코너 스윕 반경(≈30) + 여유
forearm_inner_w = fork_standoff_len;  // 하완 측판 내폭 = 표준 스탠드오프 30 (v0.13)
beam_w = 40;              // 상완/하완 중앙 보(beam) 폭
arm_lug_r = 26;           // 관절 러그(피벗 보스) 반경 — NEMA17 볼트 코너(r≈21.9) + 벽
beam_wall = 4;            // 보 쉘 벽 두께 (경량화)
pivot_engage = 14;        // 축 클램프/베어링 물림 깊이
crank_t = 8;              // J3 크랭크 암 두께
crank_hub_d = 20;         // 크랭크 허브 외경
crank_hub_w = 12;         // 크랭크 허브 폭
dl_offset = 8;            // 구동 링크 평면: 플레이트 A 외면 → 링크 중심 거리
ua_joint_x = 95;          // 상완 분할 조인트 위치 (MFG-004: 365mm > 빌드 대각 한계)
ua_lap = 36;              // 랩 조인트(소켓-테논) 물림 길이

/* ===== 너트 평면폭 (across flats) ===== */
m3_nut_af = 5.5;
m4_nut_af = 7;
m6_nut_af = 10;
link_bar_w = 12;          // 링크 바 단면 폭
link_bar_t = 6;           // 링크 바 단면 두께
link_boss_d = 24;         // 링크 단부 625ZZ 보스 외경 (625 외경 16 + 벽 4×2)

/* ===== 손목/공구 플랜지 (GEN-004) ===== */
wrist_offset = 50;        // 손목 피치 피벗 → J4(플랜지) 축 수평 오프셋
                          // — J4 모터 몸체 ↔ 하완 러그 스윕 간섭 회피 (≥ lug_r + 모터 반폭)
forearm_len = L2 - wrist_offset; // 팔꿈치 축 → 손목 피치 피벗
wrist_wall = 5;           // 손목 하우징 벽 두께
flange_d = 45;            // 공구 플랜지 직경
flange_t = 8;
flange_bc = 32;           // 그리퍼 볼트 서클
flange_bolt_d = 4;        // M4 ×4

/* ===== 리미트 스위치 (ELE-004) — KW12형 기계식 마이크로 기준품 ===== */
ls_body = [20, 10, 6.5];  // 몸체 [길이, 높이, 두께]
ls_hole_pitch = 9.5;      // 장착 홀 피치
ls_hole_d = 2.3;          // M2 셀프태핑/볼트

/* ===== 질량 산출 (MEC-007, docs/mass-budget.md) ===== */
petgcf_density = 1.30;    // g/cm³ (PETG-CF 카탈로그 일반값)
print_solidity = 0.6;     // 쉘+인필 유효 충전율 [잠정 — 슬라이서 추정으로 대체]
motor_mass_SF2424 = 510;  // g (산요 카탈로그 확정)
motor_mass_SF2423 = 380;
motor_mass_SF2422 = 300;

/* ===== 질량/성능 예산 ===== */
payload = 1.0;            // kg, 그리퍼 포함 정격 (PER-001)
moving_mass_budget = 0.8; // kg, 상완 이후 이동부 상한 (MEC-007)

/* ===== 출력 제약 — MFG-004 (Creality SparkX i7, TBD-8 해결) ===== */
build_volume = [260, 260, 255];
// main file
// 수동 평행사변형 링크 1 (passive parallelogram link, stage 1) — MEC-002
// 어깨 정적 핀 ↔ 로커 핀. 길이 = L1 (상완과 평행).
include <../config/parameters.scad>
use <../lib/utils.scad>

link_bar(L1);
